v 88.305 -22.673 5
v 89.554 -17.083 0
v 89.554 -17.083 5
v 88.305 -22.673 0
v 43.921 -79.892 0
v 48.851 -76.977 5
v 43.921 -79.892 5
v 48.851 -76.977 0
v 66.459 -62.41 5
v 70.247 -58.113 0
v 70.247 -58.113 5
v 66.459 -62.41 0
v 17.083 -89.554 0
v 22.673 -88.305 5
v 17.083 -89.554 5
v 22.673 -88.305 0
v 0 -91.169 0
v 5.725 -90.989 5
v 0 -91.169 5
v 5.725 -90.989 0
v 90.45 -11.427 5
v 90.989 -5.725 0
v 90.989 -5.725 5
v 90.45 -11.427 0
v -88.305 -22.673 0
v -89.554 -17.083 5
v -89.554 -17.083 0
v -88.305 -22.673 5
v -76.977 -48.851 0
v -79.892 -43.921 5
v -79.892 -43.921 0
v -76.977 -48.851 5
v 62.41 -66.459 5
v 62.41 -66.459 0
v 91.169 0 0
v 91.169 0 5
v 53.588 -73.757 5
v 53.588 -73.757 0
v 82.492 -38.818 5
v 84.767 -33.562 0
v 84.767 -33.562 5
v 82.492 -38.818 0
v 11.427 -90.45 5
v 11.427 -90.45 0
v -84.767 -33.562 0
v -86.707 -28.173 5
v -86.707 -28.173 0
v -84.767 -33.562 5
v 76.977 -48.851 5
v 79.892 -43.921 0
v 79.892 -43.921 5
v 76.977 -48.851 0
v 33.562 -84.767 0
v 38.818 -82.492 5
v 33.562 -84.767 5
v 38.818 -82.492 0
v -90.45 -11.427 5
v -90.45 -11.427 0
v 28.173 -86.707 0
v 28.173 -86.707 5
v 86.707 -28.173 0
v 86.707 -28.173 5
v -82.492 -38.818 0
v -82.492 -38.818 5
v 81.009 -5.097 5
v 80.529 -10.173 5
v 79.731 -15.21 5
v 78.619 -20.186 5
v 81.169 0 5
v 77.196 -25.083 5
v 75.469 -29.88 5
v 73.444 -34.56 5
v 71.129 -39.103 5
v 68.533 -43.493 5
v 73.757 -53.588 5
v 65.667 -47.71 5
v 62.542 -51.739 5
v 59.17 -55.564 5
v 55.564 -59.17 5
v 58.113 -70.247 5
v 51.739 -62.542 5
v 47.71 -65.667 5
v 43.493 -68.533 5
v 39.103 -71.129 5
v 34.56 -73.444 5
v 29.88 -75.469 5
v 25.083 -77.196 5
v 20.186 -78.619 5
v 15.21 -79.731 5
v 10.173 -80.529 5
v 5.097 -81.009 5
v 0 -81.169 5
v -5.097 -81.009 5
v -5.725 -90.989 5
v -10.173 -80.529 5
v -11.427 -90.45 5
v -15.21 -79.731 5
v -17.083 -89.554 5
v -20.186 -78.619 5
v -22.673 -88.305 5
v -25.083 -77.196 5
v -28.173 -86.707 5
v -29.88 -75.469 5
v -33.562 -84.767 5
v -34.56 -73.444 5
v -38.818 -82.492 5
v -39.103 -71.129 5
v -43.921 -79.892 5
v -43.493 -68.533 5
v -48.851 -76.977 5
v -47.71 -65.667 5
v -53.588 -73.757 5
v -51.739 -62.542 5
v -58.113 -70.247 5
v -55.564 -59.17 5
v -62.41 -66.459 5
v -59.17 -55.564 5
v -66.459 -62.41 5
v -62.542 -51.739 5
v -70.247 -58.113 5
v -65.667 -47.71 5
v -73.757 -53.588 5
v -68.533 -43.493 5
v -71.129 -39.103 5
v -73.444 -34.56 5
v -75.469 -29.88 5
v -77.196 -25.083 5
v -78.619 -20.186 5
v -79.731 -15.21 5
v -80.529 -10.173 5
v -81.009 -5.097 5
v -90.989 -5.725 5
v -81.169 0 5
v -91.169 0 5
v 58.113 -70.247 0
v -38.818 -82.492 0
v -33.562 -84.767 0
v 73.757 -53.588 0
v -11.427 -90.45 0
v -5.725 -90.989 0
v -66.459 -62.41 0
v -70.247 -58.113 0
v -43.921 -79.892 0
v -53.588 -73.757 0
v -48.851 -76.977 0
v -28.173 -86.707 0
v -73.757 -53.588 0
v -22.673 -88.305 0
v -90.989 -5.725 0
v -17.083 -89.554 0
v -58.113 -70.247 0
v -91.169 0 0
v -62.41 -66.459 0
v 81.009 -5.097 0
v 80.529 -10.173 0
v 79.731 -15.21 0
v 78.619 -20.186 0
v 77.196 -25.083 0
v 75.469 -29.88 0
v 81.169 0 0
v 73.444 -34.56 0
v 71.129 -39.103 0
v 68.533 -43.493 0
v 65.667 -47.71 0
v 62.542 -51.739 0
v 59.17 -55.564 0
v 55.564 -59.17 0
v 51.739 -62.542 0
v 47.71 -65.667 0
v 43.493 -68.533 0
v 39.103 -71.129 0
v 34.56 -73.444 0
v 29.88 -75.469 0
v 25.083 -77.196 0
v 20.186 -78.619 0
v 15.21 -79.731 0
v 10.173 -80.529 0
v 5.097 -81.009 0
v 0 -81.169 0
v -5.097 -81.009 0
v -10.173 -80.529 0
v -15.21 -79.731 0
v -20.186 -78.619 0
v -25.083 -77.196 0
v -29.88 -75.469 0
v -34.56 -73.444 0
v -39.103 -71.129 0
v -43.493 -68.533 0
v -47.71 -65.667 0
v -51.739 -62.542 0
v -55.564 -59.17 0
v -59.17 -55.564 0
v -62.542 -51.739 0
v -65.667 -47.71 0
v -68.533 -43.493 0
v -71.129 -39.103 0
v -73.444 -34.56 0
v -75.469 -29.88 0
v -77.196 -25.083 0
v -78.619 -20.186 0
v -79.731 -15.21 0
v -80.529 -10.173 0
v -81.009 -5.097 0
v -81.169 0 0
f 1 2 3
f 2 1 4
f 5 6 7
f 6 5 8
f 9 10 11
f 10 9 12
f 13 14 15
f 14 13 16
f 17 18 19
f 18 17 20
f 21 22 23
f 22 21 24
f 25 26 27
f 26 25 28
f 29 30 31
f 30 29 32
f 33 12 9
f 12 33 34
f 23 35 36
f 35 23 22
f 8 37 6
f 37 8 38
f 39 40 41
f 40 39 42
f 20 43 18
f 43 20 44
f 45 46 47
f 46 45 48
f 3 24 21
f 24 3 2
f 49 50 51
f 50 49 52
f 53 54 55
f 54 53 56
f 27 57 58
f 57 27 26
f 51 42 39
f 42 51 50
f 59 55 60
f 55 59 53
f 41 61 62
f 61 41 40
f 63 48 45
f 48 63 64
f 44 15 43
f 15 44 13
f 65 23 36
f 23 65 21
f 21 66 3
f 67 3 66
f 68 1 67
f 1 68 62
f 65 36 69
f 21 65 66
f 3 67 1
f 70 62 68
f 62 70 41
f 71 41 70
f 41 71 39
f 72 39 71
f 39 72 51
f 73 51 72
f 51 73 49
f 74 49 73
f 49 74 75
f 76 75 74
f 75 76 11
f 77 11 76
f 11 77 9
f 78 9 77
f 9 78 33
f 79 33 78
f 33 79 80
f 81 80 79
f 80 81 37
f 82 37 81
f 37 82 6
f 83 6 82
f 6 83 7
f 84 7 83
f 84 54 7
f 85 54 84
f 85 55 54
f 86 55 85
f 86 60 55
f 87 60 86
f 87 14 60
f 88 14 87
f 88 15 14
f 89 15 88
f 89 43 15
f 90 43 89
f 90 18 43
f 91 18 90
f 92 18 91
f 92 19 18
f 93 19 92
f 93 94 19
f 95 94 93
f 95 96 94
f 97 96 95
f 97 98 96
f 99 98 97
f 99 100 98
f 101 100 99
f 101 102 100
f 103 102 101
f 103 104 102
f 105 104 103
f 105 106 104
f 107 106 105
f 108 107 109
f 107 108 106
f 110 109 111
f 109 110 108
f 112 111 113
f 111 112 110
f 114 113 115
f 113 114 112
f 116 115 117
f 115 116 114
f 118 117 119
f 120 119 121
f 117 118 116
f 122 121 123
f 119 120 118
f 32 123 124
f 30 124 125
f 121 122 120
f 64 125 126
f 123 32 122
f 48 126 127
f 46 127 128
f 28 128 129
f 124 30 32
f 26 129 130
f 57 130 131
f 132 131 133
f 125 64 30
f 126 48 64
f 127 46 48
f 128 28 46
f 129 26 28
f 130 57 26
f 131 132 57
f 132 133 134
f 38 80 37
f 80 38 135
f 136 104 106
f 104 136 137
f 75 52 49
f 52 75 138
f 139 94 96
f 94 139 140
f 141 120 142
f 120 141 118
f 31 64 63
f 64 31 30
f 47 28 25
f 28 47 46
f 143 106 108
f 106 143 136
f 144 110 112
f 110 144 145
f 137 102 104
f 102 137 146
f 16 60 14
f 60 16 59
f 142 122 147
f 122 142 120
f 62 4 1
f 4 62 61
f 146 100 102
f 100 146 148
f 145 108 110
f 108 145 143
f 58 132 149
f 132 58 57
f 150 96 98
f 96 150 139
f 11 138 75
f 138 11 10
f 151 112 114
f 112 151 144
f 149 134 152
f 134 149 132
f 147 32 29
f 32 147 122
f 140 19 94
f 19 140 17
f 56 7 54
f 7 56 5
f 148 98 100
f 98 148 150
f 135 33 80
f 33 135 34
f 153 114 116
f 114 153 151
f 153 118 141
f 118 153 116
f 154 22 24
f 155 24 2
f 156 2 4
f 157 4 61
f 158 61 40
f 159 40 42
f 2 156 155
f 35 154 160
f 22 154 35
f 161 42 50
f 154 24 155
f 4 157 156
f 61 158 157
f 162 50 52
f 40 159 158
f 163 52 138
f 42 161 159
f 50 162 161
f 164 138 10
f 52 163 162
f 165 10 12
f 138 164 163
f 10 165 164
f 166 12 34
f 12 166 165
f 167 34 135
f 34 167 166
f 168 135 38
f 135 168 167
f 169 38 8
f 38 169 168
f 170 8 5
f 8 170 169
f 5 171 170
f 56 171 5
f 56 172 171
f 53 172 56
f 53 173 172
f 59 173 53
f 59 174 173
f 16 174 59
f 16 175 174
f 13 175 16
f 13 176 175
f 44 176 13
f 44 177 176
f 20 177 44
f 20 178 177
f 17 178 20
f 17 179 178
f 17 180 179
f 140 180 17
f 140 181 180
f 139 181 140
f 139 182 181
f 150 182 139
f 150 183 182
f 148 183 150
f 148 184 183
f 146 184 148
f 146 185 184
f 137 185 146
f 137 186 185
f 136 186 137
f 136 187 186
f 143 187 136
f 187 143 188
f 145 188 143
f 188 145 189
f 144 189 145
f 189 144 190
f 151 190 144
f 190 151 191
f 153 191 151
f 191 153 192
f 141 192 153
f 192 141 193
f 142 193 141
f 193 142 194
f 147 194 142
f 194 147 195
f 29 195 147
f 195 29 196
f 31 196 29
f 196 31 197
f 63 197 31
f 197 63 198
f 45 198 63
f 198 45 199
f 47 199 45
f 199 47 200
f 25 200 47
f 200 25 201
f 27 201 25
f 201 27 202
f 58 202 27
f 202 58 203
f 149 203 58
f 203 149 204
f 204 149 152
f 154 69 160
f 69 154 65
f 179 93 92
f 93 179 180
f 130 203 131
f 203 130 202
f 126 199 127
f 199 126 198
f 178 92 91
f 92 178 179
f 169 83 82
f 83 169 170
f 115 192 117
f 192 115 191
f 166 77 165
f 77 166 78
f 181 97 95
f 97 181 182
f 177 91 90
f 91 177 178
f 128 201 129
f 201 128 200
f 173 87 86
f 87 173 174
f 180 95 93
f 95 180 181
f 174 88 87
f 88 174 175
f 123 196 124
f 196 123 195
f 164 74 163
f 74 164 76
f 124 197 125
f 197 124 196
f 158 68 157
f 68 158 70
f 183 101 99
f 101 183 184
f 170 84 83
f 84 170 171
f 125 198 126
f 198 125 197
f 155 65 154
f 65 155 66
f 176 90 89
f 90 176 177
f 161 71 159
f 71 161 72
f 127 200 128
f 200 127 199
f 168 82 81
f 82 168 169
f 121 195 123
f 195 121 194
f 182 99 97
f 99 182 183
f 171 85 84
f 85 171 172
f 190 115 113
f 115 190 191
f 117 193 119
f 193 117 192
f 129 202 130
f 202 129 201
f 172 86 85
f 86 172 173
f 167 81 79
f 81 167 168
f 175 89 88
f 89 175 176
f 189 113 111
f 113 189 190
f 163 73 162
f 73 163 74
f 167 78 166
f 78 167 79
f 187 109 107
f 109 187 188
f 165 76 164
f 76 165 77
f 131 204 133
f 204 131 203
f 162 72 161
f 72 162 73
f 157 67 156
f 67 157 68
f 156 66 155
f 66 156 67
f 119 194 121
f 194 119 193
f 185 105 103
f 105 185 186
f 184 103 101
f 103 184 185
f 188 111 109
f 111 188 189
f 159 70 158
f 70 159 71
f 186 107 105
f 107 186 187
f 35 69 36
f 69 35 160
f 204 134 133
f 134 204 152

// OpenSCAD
/*
   Useful tool to find 2 spots opposite of each other on round ductowk
**/

// Wall thickness for the tool (make sure it's ridgid)
wall=5;
// Vent diameter, in millimiters; Using helper function, you can also specify radius or circumference
vent_diameter=get_diameter(circumference=510);

function get_diameter (diameter, radius, circumference) 
    = (diameter!=undef ? diameter : (radius != undef ? radius*2 : circumference/3.141592));

difference() {
    cylinder(wall, d=vent_diameter+wall*4, $fn=100);
    cylinder(wall, d=vent_diameter, $fn=100);
    translate([-vent_diameter/2-wall*2,0,0]) cube([vent_diameter+wall*4,vent_diameter/2+wall*2,wall]);
}
